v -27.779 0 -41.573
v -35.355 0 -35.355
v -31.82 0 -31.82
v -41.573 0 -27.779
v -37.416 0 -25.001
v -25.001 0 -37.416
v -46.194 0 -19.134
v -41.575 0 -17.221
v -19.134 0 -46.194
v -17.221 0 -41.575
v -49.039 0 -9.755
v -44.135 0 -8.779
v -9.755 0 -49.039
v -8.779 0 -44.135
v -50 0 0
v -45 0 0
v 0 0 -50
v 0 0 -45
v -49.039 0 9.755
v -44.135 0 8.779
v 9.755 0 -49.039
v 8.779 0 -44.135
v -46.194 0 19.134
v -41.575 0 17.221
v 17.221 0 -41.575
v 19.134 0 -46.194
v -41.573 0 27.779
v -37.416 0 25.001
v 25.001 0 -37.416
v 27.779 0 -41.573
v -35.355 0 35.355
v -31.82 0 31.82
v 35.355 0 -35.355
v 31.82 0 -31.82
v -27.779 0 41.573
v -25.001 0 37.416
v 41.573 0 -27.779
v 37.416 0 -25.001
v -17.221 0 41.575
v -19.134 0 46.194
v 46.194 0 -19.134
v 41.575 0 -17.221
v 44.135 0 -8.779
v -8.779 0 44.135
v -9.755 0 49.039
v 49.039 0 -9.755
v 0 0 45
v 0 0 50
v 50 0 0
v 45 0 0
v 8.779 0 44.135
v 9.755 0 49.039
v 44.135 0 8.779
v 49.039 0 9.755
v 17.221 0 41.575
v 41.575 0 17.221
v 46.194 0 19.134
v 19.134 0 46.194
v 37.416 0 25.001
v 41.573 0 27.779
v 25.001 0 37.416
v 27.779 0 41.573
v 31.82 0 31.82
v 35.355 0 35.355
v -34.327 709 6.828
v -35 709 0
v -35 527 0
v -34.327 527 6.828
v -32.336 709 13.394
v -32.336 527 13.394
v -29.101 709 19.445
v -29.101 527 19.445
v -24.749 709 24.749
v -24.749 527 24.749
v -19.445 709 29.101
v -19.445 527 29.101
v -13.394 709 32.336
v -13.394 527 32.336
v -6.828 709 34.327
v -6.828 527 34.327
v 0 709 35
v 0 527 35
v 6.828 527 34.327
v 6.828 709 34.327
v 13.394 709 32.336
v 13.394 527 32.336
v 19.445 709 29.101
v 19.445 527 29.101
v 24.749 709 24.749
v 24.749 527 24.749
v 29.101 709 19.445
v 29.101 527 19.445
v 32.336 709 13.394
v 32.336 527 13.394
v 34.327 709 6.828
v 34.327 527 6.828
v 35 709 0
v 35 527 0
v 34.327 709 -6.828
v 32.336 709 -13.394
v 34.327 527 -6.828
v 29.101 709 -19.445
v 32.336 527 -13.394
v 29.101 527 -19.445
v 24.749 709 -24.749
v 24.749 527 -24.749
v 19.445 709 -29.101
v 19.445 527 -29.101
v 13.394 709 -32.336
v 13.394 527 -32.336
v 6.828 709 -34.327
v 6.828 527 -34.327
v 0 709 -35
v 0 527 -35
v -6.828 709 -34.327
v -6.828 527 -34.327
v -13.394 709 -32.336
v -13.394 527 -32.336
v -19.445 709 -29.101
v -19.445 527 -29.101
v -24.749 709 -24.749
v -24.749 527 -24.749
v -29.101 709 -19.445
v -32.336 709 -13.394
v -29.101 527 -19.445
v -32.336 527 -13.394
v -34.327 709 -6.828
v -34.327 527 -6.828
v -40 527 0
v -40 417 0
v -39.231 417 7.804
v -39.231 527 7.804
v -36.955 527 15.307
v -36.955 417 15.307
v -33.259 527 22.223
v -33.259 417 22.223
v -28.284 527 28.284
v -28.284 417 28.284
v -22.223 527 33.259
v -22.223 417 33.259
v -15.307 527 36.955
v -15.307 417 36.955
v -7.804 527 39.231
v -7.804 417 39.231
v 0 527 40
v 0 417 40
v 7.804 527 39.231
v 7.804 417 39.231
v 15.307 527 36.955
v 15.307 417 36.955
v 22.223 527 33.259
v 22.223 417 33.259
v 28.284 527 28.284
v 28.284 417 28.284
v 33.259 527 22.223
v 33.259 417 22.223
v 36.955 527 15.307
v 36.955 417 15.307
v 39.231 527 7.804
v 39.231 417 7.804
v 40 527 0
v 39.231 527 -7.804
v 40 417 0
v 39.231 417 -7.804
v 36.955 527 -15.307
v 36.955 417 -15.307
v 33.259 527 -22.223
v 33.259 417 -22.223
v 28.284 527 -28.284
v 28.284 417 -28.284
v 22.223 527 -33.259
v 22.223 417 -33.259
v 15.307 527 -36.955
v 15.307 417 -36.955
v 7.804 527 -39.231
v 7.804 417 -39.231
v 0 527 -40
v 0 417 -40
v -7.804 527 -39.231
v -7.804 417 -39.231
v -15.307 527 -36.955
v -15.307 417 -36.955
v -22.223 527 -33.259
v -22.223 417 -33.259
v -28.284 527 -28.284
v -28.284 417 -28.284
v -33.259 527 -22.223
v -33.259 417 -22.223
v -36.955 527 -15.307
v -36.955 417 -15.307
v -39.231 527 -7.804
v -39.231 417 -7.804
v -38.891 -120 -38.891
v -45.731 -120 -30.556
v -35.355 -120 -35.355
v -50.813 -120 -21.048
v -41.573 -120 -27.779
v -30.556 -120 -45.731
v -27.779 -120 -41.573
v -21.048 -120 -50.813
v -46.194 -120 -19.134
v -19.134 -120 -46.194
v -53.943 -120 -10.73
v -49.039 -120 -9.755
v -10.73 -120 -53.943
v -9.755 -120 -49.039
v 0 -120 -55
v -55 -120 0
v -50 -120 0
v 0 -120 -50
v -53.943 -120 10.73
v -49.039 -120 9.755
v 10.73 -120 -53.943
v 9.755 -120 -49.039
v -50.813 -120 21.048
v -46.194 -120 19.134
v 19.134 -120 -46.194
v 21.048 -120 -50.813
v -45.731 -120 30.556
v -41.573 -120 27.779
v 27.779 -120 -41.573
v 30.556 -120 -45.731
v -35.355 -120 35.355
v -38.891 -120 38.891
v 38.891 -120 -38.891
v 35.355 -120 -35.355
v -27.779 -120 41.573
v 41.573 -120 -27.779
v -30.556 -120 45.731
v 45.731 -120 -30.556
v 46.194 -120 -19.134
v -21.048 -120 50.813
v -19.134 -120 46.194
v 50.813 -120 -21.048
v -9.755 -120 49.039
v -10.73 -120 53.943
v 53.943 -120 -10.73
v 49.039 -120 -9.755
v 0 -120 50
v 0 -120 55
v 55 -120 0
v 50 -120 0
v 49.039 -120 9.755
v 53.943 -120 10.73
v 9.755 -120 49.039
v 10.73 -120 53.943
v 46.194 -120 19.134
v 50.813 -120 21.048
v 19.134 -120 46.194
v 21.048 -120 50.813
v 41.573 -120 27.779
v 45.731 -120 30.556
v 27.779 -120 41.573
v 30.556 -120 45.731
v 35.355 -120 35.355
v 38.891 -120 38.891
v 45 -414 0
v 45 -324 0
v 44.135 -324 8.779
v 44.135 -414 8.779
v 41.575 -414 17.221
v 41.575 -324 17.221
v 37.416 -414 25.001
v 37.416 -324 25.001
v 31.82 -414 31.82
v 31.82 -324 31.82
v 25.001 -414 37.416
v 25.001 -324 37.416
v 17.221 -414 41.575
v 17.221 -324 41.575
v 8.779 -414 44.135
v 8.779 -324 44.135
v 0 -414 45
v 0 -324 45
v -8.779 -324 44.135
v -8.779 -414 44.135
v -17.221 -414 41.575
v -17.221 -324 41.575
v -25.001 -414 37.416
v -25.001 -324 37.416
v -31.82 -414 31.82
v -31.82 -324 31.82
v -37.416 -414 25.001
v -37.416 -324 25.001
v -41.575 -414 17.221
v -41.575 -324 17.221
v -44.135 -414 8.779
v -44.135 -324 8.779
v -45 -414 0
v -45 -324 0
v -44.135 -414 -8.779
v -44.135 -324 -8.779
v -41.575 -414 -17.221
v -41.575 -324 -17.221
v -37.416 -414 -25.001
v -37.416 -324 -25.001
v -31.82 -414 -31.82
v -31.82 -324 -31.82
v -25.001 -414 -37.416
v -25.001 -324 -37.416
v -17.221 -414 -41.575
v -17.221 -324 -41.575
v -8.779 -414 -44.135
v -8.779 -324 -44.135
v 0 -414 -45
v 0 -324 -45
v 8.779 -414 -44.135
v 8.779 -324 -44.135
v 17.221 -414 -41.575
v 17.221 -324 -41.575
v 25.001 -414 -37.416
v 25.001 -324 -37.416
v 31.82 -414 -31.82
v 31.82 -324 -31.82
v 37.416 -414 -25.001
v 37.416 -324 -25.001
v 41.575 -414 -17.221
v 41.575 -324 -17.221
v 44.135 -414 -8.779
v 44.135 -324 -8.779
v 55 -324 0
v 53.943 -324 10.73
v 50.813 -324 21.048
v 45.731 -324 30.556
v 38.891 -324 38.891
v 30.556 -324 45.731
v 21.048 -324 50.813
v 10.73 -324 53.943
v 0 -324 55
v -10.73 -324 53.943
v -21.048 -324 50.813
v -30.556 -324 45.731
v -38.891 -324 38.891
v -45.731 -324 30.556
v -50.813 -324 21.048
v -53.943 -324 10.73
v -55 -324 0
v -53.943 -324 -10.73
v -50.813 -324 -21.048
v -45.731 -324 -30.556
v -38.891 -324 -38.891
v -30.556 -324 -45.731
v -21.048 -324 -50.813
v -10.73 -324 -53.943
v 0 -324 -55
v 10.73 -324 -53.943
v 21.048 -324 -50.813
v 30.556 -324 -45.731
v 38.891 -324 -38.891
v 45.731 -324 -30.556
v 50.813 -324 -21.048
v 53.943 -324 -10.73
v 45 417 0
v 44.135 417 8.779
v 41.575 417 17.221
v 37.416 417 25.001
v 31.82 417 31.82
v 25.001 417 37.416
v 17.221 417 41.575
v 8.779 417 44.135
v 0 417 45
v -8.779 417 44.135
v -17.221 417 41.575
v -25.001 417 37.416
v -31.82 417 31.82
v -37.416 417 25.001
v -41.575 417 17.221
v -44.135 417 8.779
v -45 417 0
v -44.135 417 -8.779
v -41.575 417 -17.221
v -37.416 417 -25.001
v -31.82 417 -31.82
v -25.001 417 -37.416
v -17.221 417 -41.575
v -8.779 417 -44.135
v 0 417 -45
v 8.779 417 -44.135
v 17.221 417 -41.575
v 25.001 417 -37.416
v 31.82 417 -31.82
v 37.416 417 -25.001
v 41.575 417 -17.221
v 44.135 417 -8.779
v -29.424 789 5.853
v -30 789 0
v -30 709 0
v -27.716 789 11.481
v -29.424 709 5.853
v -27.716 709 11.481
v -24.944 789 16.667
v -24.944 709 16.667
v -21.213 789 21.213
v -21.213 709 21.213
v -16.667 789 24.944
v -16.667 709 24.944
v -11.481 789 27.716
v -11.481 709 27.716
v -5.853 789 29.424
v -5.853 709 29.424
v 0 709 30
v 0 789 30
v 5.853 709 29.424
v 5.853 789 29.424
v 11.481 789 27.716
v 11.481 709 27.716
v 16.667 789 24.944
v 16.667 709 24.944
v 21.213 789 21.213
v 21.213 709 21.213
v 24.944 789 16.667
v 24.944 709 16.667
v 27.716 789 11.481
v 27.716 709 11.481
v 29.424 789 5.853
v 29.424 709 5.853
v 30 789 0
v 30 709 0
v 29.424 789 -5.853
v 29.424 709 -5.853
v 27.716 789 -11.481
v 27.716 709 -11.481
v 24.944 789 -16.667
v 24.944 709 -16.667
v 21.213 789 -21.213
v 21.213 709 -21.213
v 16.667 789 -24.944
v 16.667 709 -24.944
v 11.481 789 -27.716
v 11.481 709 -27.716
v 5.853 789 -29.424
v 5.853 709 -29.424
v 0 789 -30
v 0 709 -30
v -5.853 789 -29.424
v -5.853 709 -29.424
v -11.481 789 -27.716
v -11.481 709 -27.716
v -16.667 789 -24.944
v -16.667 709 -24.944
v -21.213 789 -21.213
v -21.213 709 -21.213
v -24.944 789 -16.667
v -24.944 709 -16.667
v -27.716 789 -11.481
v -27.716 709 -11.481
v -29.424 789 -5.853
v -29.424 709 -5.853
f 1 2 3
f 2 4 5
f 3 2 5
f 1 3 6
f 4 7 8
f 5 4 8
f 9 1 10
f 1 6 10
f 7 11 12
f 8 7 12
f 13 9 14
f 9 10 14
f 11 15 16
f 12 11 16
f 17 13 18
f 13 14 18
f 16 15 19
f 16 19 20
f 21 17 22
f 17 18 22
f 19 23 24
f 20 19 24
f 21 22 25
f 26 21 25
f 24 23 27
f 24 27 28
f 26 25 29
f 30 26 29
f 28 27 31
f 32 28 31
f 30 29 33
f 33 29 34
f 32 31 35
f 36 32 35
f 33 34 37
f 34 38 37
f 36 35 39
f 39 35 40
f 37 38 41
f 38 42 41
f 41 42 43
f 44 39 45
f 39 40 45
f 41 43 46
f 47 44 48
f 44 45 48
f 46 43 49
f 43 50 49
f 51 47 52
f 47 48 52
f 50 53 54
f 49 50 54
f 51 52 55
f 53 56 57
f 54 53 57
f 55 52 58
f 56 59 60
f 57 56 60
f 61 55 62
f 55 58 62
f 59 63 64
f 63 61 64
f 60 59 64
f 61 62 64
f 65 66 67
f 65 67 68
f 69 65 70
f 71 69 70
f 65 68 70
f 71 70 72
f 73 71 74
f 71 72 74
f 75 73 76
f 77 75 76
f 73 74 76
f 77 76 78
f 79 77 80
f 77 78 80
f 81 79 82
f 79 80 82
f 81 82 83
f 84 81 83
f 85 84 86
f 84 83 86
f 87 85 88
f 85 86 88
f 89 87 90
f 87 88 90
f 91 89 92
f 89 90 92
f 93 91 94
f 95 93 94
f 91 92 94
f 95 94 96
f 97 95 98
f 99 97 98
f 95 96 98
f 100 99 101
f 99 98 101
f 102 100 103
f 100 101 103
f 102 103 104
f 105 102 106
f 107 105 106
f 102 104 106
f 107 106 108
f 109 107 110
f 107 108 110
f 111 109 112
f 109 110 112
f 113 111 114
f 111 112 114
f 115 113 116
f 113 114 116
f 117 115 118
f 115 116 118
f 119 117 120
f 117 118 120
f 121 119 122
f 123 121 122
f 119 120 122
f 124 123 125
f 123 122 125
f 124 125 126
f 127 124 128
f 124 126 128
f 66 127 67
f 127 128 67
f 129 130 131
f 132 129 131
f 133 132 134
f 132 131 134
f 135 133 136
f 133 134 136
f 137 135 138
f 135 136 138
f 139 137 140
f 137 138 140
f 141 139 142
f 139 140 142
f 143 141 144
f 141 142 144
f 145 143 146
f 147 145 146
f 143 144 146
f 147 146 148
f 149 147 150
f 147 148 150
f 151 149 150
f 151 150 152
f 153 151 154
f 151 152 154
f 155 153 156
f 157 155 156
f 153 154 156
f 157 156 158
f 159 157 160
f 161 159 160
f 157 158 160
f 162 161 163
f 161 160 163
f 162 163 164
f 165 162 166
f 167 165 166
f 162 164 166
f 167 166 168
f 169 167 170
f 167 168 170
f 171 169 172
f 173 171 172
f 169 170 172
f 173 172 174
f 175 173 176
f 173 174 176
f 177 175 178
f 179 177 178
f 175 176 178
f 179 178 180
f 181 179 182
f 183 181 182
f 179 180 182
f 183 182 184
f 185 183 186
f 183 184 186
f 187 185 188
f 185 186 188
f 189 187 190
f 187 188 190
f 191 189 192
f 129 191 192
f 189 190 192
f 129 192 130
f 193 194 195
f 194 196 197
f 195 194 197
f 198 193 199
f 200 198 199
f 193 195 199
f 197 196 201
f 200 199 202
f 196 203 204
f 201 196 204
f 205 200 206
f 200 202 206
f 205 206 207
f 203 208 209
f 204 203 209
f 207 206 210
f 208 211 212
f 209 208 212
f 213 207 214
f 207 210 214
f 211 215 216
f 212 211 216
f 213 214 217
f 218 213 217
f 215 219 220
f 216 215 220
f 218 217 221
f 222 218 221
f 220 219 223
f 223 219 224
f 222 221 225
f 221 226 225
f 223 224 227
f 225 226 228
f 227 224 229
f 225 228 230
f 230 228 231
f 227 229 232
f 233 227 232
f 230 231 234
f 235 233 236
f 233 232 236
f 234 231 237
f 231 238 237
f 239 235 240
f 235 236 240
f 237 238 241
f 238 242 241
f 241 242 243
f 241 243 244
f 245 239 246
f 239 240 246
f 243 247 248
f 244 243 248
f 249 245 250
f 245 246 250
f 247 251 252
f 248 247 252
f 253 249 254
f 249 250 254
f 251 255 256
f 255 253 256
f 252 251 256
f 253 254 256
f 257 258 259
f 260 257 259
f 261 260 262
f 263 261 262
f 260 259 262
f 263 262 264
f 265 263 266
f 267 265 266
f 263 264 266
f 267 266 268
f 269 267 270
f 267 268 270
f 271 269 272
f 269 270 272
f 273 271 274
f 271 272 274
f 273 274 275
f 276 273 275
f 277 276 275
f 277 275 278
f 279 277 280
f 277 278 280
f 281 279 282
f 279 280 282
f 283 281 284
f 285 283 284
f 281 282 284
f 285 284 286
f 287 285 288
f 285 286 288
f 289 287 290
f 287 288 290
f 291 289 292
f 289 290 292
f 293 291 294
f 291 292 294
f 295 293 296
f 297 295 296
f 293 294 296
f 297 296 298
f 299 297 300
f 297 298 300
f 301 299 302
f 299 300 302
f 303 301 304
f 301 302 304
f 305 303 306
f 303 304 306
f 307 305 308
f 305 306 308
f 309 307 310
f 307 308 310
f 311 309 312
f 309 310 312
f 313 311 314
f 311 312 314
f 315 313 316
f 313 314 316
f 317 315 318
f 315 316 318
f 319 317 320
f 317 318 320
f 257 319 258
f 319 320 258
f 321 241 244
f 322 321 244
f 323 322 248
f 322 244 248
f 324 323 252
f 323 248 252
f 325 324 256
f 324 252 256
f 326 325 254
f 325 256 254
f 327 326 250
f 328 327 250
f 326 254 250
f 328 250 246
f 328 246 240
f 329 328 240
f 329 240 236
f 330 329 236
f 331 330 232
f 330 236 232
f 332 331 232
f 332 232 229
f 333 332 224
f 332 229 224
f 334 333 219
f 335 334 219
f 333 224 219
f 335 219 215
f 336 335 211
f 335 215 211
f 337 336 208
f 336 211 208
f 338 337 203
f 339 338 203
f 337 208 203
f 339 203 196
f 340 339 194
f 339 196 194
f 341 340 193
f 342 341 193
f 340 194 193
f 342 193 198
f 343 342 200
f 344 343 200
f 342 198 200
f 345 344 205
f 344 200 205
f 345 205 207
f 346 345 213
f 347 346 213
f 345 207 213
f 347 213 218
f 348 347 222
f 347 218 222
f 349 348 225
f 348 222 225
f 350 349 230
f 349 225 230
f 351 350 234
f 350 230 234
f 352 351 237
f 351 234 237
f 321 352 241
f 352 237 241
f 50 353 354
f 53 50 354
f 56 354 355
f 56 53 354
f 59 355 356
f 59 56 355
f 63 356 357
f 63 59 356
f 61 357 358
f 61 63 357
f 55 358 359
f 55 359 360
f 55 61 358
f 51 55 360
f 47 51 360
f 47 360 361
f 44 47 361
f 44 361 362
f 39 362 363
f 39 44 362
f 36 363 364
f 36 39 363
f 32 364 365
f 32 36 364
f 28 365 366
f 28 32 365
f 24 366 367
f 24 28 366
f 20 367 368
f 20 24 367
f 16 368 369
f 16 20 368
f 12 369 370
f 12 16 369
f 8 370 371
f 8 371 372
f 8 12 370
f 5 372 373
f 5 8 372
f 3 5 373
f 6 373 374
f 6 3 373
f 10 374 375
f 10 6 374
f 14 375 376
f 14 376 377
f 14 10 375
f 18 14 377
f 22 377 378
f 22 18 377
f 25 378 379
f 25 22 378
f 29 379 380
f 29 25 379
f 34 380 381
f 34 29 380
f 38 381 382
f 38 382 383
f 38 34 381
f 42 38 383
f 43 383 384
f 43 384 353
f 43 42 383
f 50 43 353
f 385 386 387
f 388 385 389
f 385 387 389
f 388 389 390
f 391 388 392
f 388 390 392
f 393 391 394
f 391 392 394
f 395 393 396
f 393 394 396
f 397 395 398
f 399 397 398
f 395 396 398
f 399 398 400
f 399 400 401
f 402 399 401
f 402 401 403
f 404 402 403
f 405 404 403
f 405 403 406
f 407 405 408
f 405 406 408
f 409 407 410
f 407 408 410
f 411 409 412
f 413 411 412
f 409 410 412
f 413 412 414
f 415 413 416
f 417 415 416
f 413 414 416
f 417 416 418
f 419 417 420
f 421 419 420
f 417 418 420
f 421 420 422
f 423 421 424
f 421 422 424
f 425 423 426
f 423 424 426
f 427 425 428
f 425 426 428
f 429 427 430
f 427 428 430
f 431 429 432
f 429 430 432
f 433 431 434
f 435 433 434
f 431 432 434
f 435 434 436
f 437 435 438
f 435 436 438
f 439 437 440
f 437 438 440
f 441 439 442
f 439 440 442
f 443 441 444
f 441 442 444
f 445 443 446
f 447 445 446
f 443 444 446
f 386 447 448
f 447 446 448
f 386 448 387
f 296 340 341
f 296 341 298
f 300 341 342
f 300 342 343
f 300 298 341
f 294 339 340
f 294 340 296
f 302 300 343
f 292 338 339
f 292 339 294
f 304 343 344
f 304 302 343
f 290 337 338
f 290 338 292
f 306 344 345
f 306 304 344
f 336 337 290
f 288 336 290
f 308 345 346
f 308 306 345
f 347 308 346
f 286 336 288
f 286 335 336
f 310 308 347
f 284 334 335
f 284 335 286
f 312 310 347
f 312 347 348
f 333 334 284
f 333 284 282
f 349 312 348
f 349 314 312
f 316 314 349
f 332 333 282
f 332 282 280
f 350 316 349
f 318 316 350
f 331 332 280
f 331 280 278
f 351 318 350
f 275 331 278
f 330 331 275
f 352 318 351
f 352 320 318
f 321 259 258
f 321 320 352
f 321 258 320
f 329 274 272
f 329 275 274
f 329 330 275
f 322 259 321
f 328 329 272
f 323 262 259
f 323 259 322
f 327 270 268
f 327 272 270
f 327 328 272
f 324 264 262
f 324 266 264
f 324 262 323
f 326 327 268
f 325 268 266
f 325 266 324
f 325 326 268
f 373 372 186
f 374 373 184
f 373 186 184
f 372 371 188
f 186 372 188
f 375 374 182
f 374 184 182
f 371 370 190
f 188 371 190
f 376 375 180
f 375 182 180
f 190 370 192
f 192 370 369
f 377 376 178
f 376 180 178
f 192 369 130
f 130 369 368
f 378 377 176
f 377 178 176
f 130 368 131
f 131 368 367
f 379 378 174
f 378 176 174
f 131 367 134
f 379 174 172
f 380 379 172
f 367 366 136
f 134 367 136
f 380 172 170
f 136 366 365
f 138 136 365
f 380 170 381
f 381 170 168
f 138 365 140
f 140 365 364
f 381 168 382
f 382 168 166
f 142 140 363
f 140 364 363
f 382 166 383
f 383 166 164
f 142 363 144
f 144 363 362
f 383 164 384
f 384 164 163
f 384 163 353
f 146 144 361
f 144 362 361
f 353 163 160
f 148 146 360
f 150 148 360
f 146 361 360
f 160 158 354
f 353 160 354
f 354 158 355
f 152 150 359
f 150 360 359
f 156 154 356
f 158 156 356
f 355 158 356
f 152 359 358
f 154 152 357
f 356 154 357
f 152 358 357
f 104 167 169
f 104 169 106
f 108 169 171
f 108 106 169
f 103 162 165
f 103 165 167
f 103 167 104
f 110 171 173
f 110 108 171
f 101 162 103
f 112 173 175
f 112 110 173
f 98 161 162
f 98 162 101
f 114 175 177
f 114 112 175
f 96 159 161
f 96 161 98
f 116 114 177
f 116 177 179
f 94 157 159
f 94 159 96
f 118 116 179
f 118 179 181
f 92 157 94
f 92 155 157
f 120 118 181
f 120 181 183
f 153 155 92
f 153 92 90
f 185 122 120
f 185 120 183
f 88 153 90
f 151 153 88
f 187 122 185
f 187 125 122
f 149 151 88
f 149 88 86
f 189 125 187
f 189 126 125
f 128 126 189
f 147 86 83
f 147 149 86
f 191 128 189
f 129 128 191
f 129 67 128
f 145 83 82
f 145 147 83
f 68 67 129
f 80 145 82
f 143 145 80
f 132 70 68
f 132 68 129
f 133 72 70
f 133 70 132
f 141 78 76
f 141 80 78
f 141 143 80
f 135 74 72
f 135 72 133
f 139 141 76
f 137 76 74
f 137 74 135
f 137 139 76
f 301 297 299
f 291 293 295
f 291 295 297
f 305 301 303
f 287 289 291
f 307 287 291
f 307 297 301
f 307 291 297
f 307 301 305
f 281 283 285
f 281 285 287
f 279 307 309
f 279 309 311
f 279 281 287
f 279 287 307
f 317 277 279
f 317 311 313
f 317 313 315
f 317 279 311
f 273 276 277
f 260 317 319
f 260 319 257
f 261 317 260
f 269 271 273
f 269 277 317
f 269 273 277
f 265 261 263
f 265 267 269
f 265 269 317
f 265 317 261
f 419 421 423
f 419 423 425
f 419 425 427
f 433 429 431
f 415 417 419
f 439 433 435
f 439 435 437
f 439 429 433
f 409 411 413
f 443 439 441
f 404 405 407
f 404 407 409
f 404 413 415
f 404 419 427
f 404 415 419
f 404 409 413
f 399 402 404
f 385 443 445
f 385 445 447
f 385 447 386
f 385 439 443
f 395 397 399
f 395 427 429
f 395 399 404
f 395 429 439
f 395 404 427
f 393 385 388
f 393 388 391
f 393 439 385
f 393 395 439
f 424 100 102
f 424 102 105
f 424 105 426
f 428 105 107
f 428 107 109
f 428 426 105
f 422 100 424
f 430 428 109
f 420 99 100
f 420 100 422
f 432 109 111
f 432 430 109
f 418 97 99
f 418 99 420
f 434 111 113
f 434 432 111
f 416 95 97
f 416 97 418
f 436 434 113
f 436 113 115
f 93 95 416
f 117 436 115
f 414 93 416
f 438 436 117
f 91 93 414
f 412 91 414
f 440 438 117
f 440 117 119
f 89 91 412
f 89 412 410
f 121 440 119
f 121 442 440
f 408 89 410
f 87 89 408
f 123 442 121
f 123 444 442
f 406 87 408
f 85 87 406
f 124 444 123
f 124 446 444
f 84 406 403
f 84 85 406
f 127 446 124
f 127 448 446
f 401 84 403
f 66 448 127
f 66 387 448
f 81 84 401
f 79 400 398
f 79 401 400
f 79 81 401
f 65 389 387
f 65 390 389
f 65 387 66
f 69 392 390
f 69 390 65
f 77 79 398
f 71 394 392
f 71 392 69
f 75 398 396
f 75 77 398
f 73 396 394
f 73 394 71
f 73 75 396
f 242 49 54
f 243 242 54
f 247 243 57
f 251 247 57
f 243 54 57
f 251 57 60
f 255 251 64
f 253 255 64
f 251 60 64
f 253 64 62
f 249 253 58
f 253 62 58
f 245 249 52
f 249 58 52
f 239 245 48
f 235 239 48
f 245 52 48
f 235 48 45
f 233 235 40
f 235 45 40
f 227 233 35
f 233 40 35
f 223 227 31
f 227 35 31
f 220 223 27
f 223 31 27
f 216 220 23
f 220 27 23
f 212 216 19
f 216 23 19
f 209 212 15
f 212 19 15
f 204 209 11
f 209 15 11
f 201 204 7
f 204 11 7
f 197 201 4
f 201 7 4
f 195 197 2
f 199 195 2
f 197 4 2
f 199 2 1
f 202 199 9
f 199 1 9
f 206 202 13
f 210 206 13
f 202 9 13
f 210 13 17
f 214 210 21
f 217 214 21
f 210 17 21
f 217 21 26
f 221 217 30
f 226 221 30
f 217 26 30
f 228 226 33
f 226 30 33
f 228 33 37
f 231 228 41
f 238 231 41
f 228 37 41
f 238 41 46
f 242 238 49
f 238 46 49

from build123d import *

# Parameters (mm, degrees)
F0_R      = 45
F1_DEPTH  = 417
F2_R      = 40
F3_DEPTH  = 110
F4_R      = 35
F5_DEPTH  = 182
F6_R      = 30
F7_DEPTH  = 80
F8_R      = 50
F9_DEPTH  = 120
F10_R     = 55
F11_DEPTH = 204
F12_R     = 45
F13_DEPTH = 90


with BuildPart() as f1:
    # F0 (on Front) → F1 (new body)
    with BuildSketch(Plane.XZ):
        Circle(F0_R)
    extrude(amount=-F1_DEPTH)

    # F2 (on face) → F3 (join)
    with BuildSketch(Plane(origin=(0, 417, 0), x_dir=(-1, 0, 0), z_dir=(0, 1, 0))):
        Circle(F2_R)
    extrude(amount=F3_DEPTH)

    # F4 (on face) → F5 (join)
    with BuildSketch(Plane(origin=(0, 527, 0), x_dir=(-1, 0, 0), z_dir=(0, 1, 0))):
        Circle(F4_R)
    extrude(amount=F5_DEPTH)

    # F6 (on face) → F7 (join)
    with BuildSketch(Plane(origin=(0, 709, 0), x_dir=(-1, 0, 0), z_dir=(0, 1, 0))):
        Circle(F6_R)
    extrude(amount=F7_DEPTH)

    # F8 (on face) → F9 (join)
    with BuildSketch(Plane.XZ):
        Circle(F8_R)
    extrude(amount=F9_DEPTH)

    # F10 (on face) → F11 (join)
    with BuildSketch(Plane.XZ.offset(120)):
        Circle(F10_R)
    extrude(amount=F11_DEPTH)

    # F12 (on face) → F13 (join)
    with BuildSketch(Plane.XZ.offset(324)):
        Circle(F12_R)
    extrude(amount=F13_DEPTH)


solid = f1.part
